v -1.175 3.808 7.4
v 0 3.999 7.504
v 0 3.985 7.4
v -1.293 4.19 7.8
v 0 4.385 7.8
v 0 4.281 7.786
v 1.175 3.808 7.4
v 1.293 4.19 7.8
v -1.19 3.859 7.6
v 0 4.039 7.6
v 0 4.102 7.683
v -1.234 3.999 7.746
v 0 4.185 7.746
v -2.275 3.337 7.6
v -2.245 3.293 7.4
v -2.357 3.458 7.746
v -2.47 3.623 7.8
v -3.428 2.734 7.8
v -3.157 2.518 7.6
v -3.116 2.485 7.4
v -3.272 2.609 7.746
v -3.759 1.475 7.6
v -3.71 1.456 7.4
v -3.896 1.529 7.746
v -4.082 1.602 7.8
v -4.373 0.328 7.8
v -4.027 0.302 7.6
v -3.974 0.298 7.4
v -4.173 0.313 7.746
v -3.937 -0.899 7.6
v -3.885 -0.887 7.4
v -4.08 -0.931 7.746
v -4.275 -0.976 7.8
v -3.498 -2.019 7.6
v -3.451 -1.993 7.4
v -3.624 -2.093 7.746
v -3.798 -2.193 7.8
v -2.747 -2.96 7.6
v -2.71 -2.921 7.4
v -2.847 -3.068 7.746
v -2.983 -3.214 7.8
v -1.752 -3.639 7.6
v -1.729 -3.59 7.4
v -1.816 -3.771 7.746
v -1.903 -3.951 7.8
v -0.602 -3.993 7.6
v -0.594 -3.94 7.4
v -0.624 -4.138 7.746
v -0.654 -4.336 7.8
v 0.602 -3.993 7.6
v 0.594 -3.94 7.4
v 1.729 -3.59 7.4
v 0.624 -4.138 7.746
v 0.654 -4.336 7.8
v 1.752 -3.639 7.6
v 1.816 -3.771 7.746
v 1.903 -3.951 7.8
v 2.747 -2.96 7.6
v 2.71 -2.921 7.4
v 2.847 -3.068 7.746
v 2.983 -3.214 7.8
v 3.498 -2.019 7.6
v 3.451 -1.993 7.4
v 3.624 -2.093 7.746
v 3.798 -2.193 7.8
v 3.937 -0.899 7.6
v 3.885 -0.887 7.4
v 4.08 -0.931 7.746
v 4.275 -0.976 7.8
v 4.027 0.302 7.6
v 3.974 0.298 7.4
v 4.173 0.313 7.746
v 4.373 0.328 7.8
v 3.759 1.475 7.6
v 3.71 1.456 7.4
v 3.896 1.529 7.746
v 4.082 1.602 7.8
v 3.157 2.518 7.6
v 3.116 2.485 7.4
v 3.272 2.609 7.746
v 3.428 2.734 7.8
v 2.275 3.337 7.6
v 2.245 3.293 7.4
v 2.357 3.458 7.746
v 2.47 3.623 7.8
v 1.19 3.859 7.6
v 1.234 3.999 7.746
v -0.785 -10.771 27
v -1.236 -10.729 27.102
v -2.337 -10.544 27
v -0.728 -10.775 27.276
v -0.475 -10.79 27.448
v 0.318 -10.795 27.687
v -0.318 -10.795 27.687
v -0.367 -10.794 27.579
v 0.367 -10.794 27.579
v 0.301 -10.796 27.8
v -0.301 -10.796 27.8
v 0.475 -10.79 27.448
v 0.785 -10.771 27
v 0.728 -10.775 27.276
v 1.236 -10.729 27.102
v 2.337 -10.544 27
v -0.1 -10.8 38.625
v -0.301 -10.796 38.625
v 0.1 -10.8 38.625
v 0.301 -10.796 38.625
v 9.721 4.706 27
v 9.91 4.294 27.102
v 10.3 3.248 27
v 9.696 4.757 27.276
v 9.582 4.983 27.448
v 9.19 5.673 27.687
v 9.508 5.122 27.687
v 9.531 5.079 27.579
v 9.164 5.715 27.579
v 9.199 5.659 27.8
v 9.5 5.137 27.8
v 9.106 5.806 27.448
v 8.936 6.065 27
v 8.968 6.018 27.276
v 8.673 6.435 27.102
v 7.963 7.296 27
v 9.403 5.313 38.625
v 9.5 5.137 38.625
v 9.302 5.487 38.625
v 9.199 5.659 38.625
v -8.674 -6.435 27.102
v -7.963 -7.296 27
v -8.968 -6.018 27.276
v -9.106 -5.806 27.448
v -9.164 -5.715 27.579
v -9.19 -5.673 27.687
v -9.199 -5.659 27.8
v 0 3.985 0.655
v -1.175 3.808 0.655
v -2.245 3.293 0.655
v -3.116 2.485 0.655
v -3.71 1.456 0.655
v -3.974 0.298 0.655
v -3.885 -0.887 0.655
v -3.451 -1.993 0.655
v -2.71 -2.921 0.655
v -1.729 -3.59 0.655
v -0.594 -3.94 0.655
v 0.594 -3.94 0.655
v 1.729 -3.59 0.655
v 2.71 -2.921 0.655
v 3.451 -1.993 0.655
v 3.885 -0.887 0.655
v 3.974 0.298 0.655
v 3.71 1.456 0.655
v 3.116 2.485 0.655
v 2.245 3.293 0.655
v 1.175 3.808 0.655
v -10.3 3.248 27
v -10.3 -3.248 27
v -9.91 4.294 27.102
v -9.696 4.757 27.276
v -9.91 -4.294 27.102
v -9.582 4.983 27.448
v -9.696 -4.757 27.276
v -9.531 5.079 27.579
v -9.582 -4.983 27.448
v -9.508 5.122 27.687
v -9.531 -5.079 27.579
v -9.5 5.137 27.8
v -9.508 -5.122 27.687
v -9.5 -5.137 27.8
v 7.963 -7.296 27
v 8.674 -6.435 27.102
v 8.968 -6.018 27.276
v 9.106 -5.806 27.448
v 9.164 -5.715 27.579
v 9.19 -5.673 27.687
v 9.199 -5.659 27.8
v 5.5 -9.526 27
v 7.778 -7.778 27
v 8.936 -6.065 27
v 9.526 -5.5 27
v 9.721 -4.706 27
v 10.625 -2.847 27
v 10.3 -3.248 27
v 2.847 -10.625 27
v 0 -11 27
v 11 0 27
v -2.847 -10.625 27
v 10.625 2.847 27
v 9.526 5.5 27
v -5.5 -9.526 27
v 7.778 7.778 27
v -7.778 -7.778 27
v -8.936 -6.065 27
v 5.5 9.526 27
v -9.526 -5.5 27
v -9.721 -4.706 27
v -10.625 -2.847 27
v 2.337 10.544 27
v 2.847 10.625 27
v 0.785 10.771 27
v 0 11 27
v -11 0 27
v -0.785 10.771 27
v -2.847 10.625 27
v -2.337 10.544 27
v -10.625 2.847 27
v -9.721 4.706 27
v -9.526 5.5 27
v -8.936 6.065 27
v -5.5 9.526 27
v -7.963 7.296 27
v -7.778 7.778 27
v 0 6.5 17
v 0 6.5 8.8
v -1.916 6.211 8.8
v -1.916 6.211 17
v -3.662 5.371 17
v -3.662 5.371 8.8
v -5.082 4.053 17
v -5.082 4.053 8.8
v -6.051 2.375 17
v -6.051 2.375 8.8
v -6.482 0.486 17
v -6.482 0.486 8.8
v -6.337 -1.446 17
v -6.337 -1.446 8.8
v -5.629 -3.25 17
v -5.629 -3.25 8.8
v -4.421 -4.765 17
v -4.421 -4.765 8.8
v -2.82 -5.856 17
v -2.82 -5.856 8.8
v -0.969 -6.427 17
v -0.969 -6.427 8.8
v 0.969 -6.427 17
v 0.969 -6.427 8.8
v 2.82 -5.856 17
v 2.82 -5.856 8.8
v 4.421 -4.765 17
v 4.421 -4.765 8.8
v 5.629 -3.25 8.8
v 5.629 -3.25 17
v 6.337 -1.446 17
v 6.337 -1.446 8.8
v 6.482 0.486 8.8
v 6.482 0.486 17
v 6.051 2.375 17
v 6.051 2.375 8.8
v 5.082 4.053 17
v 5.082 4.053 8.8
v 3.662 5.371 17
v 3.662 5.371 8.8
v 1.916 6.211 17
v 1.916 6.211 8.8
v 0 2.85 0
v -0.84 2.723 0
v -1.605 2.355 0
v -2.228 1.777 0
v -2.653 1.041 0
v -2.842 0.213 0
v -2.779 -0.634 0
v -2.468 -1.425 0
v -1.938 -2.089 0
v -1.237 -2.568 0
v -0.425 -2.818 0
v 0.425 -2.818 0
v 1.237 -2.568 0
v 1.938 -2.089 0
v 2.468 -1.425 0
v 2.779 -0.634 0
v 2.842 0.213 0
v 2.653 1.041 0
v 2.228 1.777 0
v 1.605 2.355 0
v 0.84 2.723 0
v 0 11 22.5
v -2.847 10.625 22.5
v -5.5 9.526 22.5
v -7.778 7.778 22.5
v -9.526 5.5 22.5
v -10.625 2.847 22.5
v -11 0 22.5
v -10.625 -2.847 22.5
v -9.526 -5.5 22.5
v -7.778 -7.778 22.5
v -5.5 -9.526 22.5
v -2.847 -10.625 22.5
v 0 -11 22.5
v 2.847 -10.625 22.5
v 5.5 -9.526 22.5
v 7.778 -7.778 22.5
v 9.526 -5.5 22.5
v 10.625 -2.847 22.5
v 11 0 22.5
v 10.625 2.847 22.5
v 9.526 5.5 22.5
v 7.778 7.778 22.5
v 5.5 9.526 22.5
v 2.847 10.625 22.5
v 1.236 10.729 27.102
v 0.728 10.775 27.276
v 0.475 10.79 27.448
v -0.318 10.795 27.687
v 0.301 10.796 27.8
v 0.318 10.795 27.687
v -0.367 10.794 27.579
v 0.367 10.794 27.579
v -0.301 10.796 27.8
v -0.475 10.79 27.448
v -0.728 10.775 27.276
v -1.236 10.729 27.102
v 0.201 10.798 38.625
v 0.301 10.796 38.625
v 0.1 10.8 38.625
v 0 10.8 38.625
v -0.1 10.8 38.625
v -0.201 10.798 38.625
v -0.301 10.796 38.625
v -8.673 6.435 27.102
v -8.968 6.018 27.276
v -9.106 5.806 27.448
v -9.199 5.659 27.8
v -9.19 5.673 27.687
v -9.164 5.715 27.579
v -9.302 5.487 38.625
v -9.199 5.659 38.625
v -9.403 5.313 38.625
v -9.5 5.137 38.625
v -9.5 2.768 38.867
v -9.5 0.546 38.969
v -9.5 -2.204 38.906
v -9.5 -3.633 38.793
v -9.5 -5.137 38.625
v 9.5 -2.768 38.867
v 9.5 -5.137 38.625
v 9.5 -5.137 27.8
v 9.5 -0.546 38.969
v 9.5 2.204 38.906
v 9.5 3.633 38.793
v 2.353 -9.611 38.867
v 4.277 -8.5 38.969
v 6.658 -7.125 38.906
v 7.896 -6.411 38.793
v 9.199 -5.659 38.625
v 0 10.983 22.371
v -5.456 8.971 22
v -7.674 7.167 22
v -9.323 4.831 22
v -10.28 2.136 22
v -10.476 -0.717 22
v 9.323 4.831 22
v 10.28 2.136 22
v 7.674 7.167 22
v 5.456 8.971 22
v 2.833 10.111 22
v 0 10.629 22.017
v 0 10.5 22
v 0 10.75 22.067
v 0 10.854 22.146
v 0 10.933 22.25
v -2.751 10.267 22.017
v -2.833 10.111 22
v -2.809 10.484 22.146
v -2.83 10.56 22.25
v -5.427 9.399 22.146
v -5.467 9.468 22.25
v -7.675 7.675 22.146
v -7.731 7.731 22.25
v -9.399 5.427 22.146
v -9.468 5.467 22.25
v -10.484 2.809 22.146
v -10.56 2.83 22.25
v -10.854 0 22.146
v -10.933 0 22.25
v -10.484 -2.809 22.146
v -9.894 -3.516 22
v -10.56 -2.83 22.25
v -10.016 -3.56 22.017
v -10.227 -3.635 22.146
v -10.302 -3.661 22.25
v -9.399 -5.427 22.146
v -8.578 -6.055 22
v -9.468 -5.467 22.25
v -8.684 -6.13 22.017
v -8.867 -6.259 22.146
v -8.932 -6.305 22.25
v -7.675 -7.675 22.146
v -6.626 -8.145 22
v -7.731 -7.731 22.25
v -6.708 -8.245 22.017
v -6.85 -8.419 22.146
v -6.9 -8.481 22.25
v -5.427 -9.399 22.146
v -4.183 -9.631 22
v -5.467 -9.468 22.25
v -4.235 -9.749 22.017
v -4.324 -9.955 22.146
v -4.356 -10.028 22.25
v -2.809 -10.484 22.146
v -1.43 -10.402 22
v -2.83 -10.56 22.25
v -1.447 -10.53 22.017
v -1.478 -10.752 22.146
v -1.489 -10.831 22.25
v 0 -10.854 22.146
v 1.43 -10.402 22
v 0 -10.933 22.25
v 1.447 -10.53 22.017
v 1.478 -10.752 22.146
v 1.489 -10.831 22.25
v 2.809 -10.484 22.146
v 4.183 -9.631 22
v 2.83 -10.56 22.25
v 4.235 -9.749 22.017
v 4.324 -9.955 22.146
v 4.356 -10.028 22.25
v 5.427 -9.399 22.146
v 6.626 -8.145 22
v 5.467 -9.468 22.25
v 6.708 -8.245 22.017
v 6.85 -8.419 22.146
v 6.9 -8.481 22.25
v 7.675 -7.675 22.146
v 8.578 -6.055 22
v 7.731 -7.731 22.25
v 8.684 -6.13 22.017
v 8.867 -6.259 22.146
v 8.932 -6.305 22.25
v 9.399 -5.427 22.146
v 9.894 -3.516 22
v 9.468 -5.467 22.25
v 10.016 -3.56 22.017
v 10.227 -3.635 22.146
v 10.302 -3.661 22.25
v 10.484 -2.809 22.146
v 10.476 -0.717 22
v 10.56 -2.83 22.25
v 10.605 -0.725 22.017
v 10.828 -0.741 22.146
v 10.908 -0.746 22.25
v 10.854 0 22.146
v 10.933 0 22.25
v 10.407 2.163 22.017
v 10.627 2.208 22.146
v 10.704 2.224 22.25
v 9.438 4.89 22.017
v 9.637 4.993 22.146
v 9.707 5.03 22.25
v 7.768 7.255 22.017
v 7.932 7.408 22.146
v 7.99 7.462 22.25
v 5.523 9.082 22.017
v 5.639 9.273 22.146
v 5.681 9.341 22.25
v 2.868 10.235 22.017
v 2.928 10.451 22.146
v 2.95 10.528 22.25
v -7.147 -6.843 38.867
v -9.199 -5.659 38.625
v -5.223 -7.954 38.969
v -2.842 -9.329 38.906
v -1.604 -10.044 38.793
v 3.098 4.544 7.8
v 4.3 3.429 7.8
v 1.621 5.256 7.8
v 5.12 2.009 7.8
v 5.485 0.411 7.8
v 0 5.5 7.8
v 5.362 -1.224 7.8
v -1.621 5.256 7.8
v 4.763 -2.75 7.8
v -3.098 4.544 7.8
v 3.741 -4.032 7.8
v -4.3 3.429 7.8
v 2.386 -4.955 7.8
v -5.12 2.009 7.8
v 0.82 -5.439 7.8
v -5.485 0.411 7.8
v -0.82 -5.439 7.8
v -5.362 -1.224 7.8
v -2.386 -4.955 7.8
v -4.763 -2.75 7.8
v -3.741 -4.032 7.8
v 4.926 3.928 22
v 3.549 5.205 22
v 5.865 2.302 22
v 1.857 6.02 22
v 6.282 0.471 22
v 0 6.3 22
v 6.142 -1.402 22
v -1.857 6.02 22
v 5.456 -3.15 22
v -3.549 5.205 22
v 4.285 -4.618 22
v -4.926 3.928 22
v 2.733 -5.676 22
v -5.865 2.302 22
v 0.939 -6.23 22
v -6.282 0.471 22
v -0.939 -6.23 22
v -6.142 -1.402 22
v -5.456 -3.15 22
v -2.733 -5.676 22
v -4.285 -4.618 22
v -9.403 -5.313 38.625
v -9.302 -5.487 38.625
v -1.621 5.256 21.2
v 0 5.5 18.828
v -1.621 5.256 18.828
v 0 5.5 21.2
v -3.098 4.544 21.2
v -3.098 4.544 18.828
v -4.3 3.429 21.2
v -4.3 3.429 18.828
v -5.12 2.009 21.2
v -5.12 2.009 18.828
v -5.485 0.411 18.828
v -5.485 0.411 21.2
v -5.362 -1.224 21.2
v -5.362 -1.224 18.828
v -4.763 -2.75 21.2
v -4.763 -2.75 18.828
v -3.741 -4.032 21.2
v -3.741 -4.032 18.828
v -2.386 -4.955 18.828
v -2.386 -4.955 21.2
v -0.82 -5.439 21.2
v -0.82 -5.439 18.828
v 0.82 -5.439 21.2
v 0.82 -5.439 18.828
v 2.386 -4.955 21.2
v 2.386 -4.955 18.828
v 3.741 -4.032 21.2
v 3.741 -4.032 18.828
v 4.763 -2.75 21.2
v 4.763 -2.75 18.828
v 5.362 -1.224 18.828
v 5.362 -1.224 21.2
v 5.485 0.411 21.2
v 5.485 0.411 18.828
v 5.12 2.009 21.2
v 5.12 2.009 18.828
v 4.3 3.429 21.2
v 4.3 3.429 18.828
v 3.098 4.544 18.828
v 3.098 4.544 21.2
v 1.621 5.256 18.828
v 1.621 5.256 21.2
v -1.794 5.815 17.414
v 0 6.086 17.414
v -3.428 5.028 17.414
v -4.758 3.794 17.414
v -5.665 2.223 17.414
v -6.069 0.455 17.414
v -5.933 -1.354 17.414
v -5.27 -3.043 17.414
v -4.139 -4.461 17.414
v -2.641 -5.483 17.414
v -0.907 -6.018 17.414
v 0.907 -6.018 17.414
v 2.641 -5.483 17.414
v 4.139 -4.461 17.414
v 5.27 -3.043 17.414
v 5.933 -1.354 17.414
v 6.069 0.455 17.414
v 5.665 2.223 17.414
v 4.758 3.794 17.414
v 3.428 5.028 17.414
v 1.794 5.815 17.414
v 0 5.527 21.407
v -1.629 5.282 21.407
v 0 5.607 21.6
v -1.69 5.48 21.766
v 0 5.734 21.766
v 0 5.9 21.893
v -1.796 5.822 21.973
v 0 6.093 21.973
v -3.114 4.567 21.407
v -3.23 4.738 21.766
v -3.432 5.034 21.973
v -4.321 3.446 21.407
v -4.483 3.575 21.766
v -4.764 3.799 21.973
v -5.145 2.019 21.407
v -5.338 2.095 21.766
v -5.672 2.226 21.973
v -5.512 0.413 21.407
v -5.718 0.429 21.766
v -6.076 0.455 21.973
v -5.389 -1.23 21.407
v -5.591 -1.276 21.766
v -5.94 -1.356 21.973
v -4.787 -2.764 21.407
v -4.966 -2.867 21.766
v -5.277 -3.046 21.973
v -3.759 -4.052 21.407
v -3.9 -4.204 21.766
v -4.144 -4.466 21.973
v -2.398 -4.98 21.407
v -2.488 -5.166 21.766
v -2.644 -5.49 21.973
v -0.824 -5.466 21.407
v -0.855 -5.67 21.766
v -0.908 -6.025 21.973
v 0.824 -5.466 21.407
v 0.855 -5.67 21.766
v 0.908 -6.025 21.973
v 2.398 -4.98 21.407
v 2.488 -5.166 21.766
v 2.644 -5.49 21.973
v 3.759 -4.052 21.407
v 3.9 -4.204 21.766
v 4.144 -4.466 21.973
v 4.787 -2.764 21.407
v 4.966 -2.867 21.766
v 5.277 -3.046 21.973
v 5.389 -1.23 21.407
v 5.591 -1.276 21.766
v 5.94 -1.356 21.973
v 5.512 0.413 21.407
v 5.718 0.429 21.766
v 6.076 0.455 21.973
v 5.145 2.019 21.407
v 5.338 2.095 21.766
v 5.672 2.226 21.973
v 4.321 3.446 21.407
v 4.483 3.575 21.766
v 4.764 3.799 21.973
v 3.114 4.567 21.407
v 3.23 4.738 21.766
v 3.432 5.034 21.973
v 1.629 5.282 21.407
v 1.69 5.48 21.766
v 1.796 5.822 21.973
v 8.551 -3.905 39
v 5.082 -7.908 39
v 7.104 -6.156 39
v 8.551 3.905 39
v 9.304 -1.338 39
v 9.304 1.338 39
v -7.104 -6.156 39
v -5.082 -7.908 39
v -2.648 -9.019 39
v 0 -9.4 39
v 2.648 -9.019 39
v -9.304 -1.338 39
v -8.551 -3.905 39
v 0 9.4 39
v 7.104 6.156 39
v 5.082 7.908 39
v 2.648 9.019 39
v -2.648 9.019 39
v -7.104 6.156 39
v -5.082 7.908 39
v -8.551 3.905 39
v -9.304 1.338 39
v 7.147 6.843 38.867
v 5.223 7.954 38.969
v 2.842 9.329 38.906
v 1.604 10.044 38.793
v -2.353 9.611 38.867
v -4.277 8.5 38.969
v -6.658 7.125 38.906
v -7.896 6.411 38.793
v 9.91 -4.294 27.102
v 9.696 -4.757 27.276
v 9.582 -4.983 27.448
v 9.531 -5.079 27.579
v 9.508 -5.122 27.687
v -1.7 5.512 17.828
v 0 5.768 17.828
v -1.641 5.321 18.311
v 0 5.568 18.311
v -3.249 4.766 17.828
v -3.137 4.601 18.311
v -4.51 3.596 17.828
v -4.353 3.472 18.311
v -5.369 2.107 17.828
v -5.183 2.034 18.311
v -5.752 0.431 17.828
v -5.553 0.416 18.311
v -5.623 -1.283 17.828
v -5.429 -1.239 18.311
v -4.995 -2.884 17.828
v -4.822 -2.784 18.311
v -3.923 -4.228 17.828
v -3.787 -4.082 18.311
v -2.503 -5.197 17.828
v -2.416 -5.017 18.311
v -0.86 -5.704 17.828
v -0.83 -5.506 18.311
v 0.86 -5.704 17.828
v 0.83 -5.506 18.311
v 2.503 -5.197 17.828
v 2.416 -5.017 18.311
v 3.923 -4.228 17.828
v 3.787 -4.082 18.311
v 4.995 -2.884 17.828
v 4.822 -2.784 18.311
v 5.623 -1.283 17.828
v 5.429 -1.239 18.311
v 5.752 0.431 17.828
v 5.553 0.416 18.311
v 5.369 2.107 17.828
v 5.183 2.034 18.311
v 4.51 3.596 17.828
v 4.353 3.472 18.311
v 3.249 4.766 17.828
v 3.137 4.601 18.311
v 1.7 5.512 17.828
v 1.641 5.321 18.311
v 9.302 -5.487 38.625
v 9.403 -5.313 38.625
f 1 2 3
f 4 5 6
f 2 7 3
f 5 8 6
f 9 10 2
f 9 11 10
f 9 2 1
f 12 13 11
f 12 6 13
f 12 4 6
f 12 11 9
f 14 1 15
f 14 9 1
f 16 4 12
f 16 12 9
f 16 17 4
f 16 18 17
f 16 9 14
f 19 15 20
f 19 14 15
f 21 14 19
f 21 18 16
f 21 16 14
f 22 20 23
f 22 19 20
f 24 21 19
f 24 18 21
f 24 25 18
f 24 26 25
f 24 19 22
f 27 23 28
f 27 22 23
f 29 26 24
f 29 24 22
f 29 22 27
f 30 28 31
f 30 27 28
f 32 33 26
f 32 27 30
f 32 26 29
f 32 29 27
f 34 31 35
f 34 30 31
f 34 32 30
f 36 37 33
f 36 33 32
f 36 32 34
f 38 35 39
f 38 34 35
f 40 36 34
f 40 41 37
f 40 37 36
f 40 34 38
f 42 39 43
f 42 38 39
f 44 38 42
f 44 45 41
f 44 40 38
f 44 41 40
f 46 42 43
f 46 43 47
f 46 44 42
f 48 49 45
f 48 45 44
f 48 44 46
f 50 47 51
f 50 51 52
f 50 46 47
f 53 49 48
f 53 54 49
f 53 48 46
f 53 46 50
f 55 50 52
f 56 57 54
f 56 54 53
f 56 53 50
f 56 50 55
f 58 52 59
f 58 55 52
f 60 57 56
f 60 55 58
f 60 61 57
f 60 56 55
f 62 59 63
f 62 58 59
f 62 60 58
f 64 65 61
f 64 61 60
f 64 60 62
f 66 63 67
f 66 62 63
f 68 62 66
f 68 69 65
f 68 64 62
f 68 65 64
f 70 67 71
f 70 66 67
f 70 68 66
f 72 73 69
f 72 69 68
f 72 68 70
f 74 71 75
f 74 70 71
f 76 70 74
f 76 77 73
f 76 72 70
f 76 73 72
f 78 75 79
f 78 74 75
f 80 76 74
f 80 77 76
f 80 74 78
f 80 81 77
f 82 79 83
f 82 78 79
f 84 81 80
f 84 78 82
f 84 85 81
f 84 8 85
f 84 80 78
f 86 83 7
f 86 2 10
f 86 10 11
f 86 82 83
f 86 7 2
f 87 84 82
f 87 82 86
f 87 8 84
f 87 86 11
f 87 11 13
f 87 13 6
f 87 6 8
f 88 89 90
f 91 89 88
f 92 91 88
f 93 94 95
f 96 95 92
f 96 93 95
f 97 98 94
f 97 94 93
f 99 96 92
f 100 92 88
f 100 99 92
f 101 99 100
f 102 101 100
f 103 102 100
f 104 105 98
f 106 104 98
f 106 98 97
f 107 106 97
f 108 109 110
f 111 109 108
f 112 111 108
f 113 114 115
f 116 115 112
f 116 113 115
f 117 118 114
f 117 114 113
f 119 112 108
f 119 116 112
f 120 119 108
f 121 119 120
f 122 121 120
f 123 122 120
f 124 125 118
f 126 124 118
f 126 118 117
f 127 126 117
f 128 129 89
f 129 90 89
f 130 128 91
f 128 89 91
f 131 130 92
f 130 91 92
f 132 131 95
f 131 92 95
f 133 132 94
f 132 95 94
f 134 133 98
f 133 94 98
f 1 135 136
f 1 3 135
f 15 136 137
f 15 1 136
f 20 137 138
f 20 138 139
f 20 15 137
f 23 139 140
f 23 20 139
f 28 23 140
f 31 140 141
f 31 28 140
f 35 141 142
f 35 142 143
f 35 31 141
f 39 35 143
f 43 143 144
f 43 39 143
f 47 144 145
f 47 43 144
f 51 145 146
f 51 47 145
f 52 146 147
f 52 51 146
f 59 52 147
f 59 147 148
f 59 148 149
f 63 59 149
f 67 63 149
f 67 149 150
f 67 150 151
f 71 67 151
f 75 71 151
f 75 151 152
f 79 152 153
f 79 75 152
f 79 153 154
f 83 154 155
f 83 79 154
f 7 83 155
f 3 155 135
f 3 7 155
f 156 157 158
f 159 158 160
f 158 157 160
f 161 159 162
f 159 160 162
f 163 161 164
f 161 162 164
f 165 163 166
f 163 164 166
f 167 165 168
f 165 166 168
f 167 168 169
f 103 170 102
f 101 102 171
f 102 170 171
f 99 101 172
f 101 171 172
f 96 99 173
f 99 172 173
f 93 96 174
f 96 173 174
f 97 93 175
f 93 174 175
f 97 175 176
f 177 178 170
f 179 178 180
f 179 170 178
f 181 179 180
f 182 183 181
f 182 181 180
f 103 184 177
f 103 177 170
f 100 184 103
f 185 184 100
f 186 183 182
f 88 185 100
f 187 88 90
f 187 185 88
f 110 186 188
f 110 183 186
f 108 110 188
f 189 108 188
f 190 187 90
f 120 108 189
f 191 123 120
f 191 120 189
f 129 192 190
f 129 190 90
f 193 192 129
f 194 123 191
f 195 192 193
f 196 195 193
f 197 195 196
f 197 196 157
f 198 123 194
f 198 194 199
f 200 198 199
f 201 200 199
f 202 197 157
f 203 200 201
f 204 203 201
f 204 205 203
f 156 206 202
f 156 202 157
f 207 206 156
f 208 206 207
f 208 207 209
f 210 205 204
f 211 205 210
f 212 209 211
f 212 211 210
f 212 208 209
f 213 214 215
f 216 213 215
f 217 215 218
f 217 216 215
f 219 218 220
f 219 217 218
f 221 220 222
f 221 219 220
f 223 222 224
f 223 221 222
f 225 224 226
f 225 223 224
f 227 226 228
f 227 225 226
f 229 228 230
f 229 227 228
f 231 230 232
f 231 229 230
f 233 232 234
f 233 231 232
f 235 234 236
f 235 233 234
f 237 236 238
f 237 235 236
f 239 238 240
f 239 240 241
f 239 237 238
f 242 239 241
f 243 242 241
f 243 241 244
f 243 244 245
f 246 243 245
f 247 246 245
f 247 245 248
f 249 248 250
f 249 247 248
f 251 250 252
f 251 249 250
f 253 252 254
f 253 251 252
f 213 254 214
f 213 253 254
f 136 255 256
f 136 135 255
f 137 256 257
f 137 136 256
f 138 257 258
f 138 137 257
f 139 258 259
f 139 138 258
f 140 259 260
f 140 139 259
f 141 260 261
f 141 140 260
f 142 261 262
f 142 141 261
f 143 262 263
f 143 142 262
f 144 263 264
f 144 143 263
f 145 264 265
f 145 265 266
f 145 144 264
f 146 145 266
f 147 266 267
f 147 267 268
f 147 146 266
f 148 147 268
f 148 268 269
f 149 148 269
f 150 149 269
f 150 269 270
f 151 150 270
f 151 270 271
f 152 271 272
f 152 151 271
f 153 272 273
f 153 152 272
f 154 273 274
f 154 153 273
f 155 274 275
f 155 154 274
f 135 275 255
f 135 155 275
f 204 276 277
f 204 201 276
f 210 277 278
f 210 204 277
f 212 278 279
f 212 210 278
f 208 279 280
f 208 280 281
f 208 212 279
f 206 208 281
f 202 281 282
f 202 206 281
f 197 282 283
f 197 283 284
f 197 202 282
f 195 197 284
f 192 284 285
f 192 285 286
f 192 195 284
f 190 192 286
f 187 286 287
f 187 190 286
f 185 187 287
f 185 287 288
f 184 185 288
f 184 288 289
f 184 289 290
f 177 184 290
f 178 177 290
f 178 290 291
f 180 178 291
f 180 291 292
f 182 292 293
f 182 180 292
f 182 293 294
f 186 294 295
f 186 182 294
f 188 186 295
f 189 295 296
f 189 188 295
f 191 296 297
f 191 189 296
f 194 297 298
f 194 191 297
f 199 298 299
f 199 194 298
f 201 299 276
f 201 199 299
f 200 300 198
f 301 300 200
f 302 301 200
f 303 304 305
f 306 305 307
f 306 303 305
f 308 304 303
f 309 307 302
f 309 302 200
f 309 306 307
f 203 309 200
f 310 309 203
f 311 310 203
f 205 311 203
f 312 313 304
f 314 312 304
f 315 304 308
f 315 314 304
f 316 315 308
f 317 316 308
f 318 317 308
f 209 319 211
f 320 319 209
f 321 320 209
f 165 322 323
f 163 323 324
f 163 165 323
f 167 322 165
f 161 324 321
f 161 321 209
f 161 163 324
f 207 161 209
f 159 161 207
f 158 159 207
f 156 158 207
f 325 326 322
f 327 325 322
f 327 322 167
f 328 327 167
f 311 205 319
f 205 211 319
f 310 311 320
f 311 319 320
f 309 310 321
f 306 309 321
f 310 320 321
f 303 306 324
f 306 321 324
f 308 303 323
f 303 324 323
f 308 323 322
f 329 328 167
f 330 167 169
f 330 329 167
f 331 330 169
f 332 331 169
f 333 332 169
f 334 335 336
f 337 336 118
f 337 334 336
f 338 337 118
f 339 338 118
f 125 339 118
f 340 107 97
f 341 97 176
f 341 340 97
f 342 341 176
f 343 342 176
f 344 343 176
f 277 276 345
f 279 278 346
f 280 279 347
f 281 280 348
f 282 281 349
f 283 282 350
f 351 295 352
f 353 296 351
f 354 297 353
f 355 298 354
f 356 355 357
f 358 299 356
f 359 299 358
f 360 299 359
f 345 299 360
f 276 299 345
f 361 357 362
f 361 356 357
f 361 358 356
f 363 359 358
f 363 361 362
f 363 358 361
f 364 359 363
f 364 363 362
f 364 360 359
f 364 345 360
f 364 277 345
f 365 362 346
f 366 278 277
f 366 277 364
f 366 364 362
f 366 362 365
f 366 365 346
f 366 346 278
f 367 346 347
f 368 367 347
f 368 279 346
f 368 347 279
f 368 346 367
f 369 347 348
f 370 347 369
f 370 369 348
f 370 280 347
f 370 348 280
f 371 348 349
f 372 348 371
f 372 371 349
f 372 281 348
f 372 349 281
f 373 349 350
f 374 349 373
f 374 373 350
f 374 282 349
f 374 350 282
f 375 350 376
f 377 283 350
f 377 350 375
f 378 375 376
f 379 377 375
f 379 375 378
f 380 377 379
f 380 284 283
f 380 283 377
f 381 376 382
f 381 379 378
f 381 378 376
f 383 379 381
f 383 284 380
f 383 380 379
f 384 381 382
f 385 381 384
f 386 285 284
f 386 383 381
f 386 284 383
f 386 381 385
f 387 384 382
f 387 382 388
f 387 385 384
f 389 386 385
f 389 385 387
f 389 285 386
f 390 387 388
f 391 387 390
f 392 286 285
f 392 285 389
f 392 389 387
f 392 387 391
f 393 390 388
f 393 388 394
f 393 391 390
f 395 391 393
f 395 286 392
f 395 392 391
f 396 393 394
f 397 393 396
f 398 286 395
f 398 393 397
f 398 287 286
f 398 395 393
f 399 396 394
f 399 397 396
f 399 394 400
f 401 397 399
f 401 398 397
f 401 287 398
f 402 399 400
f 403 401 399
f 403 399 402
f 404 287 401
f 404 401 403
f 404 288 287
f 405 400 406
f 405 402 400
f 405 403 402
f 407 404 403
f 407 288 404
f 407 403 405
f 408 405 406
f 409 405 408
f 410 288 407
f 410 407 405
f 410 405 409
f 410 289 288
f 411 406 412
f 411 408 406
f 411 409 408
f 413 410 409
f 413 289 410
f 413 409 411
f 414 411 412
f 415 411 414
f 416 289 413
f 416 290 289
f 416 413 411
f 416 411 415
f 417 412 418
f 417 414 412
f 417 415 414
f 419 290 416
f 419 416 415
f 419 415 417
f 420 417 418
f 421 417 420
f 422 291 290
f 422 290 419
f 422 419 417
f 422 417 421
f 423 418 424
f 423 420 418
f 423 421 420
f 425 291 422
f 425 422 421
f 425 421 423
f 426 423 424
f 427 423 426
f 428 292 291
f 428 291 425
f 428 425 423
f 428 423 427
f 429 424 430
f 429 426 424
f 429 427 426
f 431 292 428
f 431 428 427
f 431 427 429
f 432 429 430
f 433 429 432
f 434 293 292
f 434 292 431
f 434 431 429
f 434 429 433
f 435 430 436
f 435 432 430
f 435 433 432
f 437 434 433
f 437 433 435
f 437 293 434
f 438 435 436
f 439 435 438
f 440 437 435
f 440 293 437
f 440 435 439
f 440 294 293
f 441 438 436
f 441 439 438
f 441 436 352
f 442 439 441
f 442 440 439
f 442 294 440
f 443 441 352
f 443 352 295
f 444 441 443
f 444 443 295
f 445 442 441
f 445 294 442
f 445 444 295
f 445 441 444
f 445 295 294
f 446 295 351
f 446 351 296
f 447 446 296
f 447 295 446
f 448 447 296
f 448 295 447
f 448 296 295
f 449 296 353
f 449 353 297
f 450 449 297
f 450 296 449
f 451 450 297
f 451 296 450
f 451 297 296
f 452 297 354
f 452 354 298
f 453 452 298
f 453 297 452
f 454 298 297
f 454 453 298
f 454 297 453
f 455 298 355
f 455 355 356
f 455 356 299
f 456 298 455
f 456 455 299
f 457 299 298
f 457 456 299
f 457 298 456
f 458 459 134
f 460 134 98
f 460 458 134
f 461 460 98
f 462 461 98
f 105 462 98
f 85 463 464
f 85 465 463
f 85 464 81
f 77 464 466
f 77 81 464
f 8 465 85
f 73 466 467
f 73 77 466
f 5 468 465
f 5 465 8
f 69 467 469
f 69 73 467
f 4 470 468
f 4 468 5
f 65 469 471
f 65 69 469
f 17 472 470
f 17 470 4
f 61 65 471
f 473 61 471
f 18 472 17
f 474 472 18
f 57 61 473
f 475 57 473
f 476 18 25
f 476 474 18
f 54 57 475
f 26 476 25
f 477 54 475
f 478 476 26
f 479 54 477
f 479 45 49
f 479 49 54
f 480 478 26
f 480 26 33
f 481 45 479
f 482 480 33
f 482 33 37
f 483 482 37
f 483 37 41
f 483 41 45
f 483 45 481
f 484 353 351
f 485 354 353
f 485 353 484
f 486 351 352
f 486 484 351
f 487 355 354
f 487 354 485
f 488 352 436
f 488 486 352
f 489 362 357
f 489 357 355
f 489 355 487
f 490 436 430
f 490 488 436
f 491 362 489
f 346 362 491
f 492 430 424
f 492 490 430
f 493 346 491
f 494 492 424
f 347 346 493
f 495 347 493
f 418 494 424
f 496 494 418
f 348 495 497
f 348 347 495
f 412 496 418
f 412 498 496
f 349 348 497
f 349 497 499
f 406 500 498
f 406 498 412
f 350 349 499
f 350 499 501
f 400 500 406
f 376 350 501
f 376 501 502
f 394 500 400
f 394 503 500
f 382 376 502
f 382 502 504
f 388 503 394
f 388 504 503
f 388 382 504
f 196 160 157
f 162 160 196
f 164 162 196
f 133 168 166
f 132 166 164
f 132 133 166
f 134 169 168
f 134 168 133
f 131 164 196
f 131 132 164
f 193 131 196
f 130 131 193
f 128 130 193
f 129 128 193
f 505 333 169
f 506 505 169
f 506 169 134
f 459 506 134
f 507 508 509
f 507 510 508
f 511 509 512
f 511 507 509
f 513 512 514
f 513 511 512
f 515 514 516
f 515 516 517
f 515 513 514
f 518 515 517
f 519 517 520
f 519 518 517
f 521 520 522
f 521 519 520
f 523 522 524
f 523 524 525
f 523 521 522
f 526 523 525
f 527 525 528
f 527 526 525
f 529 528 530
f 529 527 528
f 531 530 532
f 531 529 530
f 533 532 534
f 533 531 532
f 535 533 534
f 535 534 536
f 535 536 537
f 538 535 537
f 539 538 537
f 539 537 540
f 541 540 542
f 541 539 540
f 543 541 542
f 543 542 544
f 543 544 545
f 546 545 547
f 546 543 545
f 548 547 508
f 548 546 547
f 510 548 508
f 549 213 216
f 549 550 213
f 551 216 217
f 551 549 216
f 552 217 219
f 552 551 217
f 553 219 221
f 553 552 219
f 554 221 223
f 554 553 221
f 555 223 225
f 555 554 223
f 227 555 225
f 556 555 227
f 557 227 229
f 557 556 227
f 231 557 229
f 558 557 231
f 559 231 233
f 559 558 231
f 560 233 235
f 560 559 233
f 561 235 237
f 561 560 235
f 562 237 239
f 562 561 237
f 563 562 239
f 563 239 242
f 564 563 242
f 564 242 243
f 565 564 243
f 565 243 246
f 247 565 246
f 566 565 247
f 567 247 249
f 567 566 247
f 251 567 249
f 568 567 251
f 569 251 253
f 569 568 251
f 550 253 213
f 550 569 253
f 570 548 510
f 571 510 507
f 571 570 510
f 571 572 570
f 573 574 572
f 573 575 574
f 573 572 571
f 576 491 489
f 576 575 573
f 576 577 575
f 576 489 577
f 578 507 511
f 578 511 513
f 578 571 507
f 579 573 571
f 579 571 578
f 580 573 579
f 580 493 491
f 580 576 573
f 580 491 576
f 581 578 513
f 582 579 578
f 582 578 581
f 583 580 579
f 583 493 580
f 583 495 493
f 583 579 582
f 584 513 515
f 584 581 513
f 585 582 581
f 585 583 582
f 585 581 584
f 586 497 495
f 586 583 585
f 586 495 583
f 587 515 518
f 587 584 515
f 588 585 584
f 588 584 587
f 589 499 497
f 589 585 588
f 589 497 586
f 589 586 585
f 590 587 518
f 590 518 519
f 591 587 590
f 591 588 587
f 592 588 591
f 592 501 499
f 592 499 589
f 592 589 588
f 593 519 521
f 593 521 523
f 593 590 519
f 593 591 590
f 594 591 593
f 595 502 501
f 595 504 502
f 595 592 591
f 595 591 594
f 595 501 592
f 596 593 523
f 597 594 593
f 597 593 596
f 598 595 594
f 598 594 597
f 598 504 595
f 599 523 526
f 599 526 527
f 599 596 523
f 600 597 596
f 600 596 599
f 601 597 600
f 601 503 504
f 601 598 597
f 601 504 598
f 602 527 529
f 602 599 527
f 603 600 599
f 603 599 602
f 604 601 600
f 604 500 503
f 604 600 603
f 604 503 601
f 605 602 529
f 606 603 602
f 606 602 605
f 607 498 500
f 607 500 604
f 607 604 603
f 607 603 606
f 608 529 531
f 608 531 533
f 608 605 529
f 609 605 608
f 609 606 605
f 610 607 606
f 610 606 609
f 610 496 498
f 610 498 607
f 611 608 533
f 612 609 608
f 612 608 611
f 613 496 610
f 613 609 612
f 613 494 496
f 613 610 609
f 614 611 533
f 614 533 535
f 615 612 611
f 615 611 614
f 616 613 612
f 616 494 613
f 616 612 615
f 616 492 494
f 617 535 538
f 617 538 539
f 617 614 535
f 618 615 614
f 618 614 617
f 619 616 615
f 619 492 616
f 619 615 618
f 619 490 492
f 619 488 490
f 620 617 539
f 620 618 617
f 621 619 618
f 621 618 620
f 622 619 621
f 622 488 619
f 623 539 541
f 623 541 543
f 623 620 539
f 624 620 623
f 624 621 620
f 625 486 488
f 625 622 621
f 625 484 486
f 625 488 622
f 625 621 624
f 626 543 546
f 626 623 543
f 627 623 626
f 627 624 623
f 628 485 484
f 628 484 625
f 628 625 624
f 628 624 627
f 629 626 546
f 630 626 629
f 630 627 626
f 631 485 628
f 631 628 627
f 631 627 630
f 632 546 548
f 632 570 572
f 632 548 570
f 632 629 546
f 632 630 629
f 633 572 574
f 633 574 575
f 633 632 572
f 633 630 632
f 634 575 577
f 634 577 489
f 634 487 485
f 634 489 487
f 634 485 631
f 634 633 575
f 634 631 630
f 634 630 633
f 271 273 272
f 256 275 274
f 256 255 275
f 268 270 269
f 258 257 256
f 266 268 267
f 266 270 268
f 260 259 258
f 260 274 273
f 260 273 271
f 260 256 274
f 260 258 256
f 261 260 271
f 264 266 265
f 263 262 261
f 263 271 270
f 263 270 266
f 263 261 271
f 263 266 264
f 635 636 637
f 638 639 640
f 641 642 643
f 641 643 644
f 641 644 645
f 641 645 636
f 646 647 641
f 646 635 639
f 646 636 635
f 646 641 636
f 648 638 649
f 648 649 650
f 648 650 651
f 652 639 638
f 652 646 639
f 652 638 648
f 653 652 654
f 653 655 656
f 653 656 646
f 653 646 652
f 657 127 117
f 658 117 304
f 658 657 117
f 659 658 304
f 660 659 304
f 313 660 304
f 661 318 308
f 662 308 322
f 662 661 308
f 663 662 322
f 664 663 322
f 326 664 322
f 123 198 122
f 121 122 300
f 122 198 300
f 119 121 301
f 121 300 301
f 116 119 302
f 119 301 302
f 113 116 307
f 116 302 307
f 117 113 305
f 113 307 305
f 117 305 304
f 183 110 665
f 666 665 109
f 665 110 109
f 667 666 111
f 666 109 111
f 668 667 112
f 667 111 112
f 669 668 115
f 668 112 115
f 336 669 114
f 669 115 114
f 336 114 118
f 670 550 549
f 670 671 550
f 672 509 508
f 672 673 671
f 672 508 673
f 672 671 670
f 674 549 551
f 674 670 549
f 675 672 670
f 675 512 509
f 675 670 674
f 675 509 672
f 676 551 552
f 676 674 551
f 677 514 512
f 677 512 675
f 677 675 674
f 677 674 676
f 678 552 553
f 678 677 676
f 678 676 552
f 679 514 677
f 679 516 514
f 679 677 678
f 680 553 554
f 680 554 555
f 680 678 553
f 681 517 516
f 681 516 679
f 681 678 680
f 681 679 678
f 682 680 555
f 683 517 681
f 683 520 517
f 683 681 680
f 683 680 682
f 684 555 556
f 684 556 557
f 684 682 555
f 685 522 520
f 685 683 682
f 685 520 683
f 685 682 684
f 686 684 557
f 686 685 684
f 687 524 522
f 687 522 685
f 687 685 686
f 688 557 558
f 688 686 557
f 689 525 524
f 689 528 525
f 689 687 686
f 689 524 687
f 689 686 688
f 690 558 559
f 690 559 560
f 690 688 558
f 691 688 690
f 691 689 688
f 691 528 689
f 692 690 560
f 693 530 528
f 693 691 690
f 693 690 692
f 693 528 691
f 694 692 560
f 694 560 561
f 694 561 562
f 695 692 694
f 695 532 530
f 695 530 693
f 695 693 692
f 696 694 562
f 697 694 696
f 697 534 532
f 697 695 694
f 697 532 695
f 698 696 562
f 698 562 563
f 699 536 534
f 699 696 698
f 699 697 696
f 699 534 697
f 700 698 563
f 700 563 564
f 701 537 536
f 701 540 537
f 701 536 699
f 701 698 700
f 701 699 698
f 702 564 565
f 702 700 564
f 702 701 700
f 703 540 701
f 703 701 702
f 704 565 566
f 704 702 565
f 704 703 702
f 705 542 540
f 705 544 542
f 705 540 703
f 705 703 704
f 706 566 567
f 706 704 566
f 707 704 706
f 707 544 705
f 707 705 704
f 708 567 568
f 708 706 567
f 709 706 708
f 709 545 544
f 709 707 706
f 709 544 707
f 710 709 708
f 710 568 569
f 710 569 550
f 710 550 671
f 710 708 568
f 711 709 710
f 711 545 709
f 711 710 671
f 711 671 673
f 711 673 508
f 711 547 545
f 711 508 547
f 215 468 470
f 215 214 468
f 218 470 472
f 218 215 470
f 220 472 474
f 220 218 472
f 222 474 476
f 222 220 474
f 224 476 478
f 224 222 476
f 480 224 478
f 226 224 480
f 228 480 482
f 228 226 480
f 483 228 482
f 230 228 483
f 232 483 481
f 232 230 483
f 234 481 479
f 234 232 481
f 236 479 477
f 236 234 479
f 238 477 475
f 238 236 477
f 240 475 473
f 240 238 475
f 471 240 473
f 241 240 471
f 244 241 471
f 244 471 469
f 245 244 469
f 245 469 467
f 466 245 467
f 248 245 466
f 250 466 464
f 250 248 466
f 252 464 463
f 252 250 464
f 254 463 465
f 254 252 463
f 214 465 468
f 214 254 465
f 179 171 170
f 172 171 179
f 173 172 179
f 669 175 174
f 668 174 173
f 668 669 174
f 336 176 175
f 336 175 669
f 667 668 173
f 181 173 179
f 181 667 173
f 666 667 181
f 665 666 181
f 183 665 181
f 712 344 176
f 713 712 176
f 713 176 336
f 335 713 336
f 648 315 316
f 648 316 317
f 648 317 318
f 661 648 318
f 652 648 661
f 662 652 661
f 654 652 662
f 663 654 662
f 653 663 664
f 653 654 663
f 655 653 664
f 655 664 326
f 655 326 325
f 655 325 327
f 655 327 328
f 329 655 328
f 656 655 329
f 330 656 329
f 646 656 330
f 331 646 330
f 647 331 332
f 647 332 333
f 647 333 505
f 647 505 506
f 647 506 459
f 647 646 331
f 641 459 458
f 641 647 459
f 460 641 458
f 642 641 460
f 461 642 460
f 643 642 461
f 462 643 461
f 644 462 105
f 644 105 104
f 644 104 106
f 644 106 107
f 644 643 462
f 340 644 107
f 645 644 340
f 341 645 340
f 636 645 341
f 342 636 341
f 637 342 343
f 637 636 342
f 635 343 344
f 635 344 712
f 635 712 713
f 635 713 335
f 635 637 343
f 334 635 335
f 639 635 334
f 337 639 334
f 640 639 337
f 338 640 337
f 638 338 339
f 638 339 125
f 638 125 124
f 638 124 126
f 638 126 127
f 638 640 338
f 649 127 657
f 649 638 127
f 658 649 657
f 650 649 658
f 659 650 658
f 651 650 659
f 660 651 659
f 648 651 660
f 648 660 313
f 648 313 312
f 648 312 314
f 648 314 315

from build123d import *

# Parameters (mm, degrees)
SKETCH2_R          = 12.258164927
CUT_EXTRUDE1_DEPTH = 12
FILLET3_R          = 0.8
FILLET6_R          = 0.8
FILLET7_R          = 0.8


with BuildPart() as part:
    # Sketch1 → Revolve1 (revolve)
    with BuildSketch(Plane(origin=(0, 0, 0), x_dir=(0, 0, -1), z_dir=(1, 0, 0))):
        with BuildLine():
            Line((0, 0), (0, 2.85))
            Line((0, 2.85), (-0.655292556, 3.985))
            Line((-0.655292556, 3.985), (-7.4, 3.985))
            ThreePointArc((-7.4, 3.985), (-7.682842712, 4.102157288), (-7.8, 4.385))
            Line((-7.8, 4.385), (-7.8, 5.5))
            Line((-7.8, 5.5), (-8.8, 6.5))
            Line((-8.8, 6.5), (-17, 6.5))
            Line((-17, 6.5), (-17.414213562, 6.085786438))
            ThreePointArc((-17.414213562, 6.085786438), (-18.06306026, 5.652240935), (-18.828427125, 5.5))
            Line((-18.828427125, 5.5), (-21.2, 5.5))
            ThreePointArc((-21.2, 5.5), (-21.765685425, 5.734314575), (-22, 6.3))
            Line((-22, 6.3), (-22, 10.5))
            ThreePointArc((-22, 10.5), (-22.146446609, 10.853553391), (-22.5, 11))
            Line((-22.5, 11), (-27, 11))
            Line((-27, 11), (-27, 10.8))
            Line((-27, 10.8), (-38.624871131, 10.8))
            Line((-38.624871131, 10.8), (-39, 9.4))
            Line((-39, 9.4), (-39, 0))
            Line((-39, 0), (0, 0))
        make_face()
    revolve(axis=Axis((0, 0, 0), (0, 0, 1)))

    # Sketch2 → Cut-Extrude1 (cut)
    with BuildSketch(Plane.XY.offset(39)):
        Circle(SKETCH2_R)
        Polygon((0, -10.969655115), (9.5, -5.484827557), (9.5, 5.484827557), (0, 10.969655115), (-9.5, 5.484827557), (-9.5, -5.484827557), align=None, mode=Mode.SUBTRACT)
    extrude(amount=-CUT_EXTRUDE1_DEPTH, mode=Mode.SUBTRACT)

    # Fillet3
    fillet3_edges = [part.edges().sort_by_distance(p)[0] for p in [
        (4.75, 8.227241336, 27),
        (-4.75, -8.227241336, 27),
    ]]
    fillet(fillet3_edges, radius=FILLET3_R)

    # Fillet6
    fillet6_edges = [part.edges().sort_by_distance(p)[0] for p in [
        (4.75, -8.227241336, 27),
        (-4.75, 8.227241336, 27),
    ]]
    fillet(fillet6_edges, radius=FILLET6_R)

    # Fillet7
    fillet7_edges = [part.edges().sort_by_distance(p)[0] for p in [
        (9.5, 0, 27),
        (-9.5, 0, 27),
    ]]
    fillet(fillet7_edges, radius=FILLET7_R)


solid = part.part
